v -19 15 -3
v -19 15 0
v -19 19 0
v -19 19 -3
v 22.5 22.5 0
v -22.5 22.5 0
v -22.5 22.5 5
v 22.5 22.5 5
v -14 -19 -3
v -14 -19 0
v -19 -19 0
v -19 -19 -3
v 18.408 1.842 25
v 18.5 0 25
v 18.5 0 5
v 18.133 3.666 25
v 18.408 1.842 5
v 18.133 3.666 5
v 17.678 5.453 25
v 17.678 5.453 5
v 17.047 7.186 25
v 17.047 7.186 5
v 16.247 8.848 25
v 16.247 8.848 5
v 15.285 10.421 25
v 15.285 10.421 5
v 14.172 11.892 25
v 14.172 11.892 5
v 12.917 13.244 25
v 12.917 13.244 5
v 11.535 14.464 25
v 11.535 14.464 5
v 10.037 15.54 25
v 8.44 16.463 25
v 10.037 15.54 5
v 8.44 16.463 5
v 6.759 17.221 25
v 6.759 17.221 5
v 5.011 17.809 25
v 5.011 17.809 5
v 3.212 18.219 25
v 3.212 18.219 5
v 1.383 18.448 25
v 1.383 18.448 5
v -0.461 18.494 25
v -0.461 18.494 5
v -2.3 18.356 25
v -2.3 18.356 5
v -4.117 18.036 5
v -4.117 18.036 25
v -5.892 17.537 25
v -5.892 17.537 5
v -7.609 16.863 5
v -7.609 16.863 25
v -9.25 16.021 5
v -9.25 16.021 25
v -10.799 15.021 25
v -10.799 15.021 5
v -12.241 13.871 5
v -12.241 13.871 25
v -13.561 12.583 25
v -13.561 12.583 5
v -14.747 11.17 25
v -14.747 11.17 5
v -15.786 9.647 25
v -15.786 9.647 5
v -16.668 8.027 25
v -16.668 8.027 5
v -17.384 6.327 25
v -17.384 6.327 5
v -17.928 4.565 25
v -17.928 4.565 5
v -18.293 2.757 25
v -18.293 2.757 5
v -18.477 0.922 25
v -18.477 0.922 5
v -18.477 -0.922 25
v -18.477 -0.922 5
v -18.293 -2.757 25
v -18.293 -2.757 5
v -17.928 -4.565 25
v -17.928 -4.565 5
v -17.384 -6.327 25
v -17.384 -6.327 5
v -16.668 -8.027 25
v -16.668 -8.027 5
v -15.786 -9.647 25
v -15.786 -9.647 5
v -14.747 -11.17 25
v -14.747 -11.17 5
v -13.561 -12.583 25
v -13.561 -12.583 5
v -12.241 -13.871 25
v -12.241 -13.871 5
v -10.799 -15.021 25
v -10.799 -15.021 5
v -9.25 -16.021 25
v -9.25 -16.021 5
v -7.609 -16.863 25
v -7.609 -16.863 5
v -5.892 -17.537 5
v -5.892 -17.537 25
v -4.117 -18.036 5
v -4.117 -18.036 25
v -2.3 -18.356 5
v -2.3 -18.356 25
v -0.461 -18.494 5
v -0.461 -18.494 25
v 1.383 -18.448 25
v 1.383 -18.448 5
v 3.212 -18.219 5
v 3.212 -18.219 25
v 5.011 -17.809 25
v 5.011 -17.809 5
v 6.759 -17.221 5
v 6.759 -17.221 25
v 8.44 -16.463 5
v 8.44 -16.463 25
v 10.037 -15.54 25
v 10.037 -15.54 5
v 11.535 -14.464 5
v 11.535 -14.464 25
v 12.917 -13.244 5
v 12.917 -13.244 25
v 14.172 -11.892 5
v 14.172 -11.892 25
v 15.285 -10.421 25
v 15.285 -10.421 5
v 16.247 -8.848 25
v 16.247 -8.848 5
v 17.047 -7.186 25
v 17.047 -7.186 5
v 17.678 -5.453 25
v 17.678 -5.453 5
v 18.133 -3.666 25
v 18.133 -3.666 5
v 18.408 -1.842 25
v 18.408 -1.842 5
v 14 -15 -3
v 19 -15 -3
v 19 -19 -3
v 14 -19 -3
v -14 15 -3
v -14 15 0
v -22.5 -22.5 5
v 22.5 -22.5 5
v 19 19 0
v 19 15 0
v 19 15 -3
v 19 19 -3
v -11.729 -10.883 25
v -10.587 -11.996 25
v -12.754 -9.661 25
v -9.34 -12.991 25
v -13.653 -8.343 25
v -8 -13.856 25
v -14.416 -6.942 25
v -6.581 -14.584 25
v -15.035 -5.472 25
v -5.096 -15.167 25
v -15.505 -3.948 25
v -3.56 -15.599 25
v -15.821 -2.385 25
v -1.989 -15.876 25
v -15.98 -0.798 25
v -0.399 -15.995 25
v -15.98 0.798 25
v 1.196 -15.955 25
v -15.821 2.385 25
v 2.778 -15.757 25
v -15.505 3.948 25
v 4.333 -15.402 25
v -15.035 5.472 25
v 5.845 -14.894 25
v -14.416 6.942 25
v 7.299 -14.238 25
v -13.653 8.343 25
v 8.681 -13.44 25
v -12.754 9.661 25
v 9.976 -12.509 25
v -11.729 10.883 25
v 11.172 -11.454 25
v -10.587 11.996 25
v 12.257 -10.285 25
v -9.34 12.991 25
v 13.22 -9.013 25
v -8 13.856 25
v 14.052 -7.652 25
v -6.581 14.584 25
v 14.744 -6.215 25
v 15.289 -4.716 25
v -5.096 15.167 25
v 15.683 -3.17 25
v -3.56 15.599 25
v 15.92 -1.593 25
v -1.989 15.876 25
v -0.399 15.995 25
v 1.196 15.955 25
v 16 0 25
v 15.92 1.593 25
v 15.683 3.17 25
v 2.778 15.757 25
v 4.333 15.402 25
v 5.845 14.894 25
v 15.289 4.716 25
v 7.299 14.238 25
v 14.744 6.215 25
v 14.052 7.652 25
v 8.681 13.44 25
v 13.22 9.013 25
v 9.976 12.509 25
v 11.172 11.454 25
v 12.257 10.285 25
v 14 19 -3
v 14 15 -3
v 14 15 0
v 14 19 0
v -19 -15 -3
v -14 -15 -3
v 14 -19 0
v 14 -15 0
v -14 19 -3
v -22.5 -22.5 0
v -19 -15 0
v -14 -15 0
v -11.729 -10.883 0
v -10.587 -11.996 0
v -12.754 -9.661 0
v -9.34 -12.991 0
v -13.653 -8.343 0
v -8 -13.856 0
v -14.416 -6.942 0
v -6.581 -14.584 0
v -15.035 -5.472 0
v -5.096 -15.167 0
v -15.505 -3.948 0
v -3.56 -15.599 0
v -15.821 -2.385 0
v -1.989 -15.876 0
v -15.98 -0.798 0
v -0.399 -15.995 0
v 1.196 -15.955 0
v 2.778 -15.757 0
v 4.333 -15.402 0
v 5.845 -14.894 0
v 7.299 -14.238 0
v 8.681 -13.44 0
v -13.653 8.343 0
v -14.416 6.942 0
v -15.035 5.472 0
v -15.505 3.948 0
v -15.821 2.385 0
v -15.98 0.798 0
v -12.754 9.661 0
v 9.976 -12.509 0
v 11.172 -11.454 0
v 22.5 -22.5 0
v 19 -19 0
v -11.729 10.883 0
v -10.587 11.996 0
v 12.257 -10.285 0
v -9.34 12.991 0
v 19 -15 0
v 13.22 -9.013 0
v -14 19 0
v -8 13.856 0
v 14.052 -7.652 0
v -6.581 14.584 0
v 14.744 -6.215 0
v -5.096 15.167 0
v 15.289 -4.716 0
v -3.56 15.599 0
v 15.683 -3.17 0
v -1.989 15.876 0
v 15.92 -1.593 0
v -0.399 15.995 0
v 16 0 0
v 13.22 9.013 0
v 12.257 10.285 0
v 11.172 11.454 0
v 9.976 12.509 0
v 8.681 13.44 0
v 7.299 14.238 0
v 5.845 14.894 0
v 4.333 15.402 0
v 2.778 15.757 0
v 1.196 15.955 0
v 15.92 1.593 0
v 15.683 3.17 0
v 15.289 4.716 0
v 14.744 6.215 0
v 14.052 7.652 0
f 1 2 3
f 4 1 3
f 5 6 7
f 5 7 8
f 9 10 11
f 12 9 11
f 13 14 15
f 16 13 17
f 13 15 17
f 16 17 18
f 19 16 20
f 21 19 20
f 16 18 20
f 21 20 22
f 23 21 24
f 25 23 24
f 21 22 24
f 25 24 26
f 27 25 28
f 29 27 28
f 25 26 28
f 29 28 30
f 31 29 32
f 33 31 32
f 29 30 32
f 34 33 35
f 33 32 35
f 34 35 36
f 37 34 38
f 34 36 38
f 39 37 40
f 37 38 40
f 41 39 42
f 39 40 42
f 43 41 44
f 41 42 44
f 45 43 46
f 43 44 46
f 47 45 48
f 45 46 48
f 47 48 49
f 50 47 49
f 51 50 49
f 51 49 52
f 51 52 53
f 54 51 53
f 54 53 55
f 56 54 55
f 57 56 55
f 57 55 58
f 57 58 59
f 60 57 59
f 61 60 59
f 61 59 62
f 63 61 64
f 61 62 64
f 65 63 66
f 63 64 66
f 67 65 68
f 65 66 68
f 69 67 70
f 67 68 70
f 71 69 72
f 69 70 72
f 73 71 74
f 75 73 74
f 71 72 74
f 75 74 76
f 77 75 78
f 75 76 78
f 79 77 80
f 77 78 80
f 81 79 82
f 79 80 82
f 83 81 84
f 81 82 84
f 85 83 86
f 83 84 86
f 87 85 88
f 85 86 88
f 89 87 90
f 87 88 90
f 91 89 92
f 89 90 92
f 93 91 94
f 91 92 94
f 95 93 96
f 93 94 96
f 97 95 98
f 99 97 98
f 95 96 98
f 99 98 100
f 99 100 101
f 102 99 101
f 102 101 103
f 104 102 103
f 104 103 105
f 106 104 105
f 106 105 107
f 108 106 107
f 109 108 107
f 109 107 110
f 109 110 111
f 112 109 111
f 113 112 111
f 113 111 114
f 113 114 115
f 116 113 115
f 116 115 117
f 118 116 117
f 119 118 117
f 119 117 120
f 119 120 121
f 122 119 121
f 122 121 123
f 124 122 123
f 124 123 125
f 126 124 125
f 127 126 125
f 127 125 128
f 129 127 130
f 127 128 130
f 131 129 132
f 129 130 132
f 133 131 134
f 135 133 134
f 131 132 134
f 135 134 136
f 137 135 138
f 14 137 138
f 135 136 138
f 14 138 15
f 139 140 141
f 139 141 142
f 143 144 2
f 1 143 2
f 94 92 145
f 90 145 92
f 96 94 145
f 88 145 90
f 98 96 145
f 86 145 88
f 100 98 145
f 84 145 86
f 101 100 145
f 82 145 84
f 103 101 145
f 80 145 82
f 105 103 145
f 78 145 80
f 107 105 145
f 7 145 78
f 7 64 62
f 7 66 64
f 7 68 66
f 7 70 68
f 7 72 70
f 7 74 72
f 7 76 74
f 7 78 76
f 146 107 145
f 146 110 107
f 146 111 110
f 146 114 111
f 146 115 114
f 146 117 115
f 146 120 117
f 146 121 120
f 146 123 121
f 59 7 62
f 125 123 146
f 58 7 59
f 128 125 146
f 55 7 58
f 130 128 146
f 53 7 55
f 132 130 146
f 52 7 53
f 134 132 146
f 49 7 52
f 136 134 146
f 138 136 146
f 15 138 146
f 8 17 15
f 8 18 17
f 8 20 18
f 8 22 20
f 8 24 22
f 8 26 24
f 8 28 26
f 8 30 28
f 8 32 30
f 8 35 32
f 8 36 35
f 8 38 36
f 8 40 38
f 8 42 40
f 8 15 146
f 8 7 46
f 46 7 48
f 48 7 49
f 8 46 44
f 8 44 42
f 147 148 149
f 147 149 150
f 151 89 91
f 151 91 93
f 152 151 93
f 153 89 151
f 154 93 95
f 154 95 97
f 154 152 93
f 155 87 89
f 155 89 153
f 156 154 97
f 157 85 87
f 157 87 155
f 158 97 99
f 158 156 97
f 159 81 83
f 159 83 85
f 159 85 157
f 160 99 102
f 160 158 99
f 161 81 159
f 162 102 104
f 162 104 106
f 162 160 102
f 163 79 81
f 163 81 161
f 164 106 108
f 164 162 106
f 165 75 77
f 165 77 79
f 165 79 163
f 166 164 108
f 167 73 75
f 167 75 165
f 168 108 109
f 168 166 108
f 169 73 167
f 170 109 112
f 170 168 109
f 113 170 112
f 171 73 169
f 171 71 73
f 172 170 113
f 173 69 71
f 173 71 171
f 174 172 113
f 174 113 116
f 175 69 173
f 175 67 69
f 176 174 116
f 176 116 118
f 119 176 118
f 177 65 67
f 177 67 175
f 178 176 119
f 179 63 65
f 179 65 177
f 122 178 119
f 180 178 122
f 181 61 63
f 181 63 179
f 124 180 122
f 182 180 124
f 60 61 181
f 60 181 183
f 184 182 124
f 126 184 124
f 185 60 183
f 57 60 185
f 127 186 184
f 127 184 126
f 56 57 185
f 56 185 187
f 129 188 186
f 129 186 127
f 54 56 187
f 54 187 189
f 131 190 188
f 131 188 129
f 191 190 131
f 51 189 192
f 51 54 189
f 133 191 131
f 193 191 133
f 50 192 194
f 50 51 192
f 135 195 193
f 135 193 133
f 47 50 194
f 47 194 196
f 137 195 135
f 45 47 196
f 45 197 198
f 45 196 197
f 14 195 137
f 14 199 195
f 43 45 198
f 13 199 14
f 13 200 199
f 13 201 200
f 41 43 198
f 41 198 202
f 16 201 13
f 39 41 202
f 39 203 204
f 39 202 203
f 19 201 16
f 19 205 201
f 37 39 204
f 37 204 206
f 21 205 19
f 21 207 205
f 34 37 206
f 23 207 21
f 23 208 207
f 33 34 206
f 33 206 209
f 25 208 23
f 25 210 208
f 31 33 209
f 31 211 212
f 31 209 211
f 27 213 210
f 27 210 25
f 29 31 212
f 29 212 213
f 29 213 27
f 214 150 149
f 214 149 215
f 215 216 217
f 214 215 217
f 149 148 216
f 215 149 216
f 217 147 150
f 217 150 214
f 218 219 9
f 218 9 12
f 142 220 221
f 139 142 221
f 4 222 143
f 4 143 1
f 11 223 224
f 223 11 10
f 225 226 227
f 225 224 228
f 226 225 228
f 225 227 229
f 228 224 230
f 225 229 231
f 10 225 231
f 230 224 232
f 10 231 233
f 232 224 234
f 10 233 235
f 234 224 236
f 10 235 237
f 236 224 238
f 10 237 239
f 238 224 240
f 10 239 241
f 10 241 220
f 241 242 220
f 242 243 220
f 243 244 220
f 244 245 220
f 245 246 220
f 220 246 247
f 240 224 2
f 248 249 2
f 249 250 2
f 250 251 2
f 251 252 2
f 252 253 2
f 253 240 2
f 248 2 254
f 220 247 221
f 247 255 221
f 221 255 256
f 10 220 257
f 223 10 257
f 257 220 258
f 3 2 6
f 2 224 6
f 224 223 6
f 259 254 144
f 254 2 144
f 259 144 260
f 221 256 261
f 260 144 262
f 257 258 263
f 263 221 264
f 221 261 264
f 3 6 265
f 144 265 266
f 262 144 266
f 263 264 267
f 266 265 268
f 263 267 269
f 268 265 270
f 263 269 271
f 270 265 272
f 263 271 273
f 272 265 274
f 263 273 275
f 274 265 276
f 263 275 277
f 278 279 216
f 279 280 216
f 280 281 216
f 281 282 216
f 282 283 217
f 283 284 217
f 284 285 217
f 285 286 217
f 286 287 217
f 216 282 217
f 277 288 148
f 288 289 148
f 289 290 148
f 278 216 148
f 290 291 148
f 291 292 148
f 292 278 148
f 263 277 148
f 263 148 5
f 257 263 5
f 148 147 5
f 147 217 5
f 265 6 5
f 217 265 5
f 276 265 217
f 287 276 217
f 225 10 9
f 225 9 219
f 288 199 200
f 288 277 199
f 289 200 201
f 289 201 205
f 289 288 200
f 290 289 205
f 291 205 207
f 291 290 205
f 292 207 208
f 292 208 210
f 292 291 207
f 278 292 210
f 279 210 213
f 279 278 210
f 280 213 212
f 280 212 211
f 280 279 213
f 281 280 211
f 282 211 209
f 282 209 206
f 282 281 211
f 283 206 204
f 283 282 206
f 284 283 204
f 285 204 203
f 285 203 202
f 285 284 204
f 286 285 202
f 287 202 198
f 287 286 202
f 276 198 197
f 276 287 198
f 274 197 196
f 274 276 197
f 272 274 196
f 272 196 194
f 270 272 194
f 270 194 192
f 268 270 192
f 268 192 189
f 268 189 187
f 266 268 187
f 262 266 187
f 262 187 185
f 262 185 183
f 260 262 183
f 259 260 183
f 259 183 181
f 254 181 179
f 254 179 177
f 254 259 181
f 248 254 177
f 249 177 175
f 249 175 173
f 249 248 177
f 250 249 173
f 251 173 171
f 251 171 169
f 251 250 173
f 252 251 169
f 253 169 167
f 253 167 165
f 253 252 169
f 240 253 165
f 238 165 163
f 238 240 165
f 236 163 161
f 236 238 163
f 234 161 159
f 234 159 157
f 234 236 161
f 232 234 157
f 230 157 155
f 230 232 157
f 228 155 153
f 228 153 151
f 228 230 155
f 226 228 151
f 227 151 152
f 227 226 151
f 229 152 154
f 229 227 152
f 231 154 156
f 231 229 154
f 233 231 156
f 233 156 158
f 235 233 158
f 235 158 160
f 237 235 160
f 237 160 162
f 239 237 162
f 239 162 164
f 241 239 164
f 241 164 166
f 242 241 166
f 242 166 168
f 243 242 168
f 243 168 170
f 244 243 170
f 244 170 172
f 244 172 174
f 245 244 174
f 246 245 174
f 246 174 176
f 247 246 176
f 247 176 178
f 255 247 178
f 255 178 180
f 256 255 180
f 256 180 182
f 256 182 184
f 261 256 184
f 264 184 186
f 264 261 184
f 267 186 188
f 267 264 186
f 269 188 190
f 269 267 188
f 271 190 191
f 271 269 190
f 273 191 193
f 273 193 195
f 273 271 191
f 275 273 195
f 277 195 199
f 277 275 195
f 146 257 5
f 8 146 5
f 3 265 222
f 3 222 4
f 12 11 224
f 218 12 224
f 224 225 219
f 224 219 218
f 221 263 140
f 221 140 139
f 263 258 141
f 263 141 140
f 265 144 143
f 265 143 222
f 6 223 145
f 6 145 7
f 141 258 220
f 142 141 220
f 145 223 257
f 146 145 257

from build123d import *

# Parameters (mm, degrees)
ESQUISSE1_W        = 45
ESQUISSE1_H        = 45
ESQUISSE1_R        = 16
BOSS_EXTRU_1_DEPTH = 5
ESQUISSE2_R        = 18.5
ESQUISSE2_R_2      = 16
BOSS_EXTRU_2_DEPTH = 20
ESQUISSE3_W        = 5
ESQUISSE3_H        = 4
BOSS_EXTRU_3_DEPTH = 3


with BuildPart() as part:
    # Esquisse1 → Boss.-Extru.1 (new body)
    with BuildSketch(Plane.XY):
        Rectangle(ESQUISSE1_W, ESQUISSE1_H)
        Circle(ESQUISSE1_R, mode=Mode.SUBTRACT)
    extrude(amount=BOSS_EXTRU_1_DEPTH)

    # Esquisse2 → Boss.-Extru.2 (add)
    with BuildSketch(Plane.XY.offset(5)):
        Circle(ESQUISSE2_R)
        Circle(ESQUISSE2_R_2, mode=Mode.SUBTRACT)
    extrude(amount=BOSS_EXTRU_2_DEPTH)

    # Esquisse3 → Boss.-Extru.3 (add)
    with BuildSketch(Plane(origin=(0, 0, 0), x_dir=(-1, 0, 0), z_dir=(0, 0, -1))):
        with Locations((16.5, 17)):
            Rectangle(ESQUISSE3_W, ESQUISSE3_H)
        with Locations((-16.5, 17)):
            Rectangle(ESQUISSE3_W, ESQUISSE3_H)
        with Locations((-16.5, -17)):
            Rectangle(ESQUISSE3_W, ESQUISSE3_H)
        with Locations((16.5, -17)):
            Rectangle(ESQUISSE3_W, ESQUISSE3_H)
    extrude(amount=BOSS_EXTRU_3_DEPTH)


solid = part.part
